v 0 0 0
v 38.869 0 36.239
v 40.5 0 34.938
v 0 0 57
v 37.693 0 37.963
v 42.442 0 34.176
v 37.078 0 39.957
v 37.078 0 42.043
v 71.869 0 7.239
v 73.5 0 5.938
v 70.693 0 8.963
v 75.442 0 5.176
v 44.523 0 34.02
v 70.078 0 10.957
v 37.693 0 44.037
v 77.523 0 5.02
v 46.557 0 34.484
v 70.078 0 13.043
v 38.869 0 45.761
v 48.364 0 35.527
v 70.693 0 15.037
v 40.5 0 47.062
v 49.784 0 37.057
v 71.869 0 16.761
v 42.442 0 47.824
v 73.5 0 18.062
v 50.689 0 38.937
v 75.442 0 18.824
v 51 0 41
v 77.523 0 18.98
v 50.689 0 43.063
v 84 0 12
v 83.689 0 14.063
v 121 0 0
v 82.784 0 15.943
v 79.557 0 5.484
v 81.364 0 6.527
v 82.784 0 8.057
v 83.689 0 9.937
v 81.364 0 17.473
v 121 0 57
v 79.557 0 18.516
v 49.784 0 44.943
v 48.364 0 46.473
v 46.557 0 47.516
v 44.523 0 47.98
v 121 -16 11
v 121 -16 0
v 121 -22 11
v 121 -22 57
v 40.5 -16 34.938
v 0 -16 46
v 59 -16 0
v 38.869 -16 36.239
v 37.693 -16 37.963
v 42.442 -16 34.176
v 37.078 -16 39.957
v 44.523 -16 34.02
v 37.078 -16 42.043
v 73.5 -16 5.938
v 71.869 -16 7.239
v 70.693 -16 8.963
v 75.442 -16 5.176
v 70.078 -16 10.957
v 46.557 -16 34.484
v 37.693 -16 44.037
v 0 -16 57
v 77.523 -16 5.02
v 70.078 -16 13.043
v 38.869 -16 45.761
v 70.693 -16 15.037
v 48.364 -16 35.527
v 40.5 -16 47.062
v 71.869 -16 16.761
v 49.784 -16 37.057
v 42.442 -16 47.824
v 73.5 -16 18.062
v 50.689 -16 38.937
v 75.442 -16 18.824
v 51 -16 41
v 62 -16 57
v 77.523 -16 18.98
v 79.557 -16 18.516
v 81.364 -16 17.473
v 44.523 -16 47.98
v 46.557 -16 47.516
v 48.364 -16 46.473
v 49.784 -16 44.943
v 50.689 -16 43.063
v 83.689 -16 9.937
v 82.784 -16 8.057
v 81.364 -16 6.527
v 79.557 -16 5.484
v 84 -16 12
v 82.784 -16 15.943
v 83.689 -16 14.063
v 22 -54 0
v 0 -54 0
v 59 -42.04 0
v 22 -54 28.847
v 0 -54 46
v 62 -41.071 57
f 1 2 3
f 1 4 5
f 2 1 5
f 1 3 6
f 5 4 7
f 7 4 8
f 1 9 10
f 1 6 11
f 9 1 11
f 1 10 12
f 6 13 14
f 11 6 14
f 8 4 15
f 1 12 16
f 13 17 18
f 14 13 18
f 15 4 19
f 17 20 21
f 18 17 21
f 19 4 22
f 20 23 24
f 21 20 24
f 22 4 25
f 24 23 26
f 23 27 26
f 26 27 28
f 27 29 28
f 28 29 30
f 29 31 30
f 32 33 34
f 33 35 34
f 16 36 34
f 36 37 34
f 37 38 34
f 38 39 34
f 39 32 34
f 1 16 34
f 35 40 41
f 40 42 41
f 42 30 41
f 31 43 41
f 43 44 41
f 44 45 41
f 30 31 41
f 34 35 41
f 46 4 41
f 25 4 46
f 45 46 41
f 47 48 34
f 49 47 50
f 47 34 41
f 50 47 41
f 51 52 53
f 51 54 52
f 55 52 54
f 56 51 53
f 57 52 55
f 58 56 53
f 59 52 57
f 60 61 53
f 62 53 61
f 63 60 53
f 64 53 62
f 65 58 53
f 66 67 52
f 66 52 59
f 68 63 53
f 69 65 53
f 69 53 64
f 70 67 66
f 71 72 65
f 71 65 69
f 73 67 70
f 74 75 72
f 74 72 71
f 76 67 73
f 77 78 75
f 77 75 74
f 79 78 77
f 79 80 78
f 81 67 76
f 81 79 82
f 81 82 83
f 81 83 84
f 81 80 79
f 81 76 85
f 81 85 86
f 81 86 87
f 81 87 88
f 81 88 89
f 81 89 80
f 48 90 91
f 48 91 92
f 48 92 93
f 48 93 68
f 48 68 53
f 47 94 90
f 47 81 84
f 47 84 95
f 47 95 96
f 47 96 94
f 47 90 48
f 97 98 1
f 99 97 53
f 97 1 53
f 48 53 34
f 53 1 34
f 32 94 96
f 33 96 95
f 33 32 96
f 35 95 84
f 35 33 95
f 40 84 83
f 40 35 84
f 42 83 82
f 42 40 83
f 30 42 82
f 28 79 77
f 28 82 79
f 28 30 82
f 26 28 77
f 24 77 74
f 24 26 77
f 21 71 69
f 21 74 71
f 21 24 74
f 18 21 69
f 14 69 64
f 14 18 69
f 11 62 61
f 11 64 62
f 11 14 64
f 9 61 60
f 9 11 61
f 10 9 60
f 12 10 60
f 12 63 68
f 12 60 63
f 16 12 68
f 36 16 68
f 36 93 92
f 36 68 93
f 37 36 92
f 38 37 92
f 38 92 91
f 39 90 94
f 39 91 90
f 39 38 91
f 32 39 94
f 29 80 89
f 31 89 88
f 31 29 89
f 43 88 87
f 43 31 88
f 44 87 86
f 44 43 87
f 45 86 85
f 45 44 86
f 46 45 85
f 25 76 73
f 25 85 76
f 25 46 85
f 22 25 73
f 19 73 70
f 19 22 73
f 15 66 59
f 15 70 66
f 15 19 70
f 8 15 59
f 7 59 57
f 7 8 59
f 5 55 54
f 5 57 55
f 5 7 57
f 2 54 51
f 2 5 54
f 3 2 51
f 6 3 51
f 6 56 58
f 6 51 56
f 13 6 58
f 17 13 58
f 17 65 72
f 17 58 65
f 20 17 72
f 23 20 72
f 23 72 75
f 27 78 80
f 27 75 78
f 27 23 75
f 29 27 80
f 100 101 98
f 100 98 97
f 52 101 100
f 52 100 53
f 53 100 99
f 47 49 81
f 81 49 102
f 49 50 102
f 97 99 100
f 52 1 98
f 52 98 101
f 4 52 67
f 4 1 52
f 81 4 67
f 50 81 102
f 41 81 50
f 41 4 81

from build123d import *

# Parameters (mm, degrees)
F0_W     = 121
F0_H     = 57
F1_DEPTH = 54
F3_DEPTH = 57.001
F4_R     = 7
F5_DEPTH = 54.001
F7_DEPTH = 38


with BuildPart() as f1:
    # F0 (on Front) → F1 (new body)
    with BuildSketch(Plane.XZ):
        with Locations((60.5, 28.5)):
            Rectangle(F0_W, F0_H)
    extrude(amount=F1_DEPTH)

    # F2 (on face) → F3 (cut, through all)
    with BuildSketch(Plane.XY.offset(57)):
        Polygon((121, -22), (22, -54), (121, -54), align=None)
    extrude(amount=-F3_DEPTH, mode=Mode.SUBTRACT)

    # F4 (on Front) → F5 (cut, through all)
    with BuildSketch(Plane.XZ):
        with Locations((44, 41)):
            Circle(F4_R)
        with Locations((77, 12)):
            Circle(F4_R)
    extrude(amount=F5_DEPTH, mode=Mode.SUBTRACT)

    # F6 (on face) → F7 (cut)
    with BuildSketch(Plane.XZ.offset(54)):
        Polygon((59, 0), (121, 0), (121, 11), (62, 57), (0, 57), (0, 46), align=None)
    extrude(amount=-F7_DEPTH, mode=Mode.SUBTRACT)


solid = f1.part
